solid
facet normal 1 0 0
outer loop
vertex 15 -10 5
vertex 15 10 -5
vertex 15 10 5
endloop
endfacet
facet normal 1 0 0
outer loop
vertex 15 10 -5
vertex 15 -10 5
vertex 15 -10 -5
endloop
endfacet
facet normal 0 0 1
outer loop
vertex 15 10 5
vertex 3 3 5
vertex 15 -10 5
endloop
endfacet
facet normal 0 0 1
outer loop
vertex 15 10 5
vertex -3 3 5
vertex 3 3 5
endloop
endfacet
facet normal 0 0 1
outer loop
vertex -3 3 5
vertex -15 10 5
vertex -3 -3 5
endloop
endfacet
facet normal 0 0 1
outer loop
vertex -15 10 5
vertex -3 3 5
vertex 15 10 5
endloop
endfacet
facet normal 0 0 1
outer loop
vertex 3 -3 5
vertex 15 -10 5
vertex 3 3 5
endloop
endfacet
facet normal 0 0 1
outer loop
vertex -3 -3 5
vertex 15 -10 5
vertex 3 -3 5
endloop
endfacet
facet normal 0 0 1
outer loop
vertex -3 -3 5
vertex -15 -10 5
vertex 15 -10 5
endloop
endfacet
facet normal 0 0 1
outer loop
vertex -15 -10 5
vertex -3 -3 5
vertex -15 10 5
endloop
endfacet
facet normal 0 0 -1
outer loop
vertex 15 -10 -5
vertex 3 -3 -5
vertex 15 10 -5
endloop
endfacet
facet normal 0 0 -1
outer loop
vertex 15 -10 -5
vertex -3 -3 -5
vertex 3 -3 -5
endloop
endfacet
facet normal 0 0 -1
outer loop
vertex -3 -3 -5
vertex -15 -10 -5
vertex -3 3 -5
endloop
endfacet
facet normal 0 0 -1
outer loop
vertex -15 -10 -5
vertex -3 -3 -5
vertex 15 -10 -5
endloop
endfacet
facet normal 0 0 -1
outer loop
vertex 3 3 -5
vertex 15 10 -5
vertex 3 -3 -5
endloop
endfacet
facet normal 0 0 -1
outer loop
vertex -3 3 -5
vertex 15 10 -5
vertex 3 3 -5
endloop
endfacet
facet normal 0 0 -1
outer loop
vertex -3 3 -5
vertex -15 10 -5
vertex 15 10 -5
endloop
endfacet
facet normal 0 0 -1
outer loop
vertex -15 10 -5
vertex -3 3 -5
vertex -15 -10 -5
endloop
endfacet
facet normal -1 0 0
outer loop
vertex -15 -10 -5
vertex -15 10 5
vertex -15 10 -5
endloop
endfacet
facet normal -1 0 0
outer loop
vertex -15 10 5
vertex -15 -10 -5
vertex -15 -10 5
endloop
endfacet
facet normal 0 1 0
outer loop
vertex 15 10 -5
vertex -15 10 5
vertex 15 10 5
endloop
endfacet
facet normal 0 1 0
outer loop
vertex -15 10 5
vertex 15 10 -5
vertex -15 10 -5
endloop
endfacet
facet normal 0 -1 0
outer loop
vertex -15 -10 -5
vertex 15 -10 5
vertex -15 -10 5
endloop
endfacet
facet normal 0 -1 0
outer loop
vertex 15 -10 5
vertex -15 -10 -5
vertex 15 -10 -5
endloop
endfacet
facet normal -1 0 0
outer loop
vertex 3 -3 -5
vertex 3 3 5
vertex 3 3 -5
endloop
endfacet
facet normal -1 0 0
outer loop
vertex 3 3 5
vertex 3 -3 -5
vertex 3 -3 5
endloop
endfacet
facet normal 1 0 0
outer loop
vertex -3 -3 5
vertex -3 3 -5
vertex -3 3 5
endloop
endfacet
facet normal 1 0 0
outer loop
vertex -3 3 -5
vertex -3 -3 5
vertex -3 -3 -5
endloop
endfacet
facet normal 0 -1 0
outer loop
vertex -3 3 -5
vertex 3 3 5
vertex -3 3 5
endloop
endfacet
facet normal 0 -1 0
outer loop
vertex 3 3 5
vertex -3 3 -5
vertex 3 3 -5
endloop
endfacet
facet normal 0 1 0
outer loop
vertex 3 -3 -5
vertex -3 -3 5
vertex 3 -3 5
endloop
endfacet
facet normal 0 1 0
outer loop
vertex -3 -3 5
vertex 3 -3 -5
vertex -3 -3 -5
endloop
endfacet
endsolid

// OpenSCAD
// A block with a square through-hole: genus 1, all-planar, analytically exact.
// Square rather than round so every quantity has a closed form and the test
// asserts real numbers rather than whatever the tool happened to produce.
block = [30, 20, 10];
hole = 6;

difference() {
    cube(block, center = true);
    cube([hole, hole, block[2] + 2], center = true);
}
